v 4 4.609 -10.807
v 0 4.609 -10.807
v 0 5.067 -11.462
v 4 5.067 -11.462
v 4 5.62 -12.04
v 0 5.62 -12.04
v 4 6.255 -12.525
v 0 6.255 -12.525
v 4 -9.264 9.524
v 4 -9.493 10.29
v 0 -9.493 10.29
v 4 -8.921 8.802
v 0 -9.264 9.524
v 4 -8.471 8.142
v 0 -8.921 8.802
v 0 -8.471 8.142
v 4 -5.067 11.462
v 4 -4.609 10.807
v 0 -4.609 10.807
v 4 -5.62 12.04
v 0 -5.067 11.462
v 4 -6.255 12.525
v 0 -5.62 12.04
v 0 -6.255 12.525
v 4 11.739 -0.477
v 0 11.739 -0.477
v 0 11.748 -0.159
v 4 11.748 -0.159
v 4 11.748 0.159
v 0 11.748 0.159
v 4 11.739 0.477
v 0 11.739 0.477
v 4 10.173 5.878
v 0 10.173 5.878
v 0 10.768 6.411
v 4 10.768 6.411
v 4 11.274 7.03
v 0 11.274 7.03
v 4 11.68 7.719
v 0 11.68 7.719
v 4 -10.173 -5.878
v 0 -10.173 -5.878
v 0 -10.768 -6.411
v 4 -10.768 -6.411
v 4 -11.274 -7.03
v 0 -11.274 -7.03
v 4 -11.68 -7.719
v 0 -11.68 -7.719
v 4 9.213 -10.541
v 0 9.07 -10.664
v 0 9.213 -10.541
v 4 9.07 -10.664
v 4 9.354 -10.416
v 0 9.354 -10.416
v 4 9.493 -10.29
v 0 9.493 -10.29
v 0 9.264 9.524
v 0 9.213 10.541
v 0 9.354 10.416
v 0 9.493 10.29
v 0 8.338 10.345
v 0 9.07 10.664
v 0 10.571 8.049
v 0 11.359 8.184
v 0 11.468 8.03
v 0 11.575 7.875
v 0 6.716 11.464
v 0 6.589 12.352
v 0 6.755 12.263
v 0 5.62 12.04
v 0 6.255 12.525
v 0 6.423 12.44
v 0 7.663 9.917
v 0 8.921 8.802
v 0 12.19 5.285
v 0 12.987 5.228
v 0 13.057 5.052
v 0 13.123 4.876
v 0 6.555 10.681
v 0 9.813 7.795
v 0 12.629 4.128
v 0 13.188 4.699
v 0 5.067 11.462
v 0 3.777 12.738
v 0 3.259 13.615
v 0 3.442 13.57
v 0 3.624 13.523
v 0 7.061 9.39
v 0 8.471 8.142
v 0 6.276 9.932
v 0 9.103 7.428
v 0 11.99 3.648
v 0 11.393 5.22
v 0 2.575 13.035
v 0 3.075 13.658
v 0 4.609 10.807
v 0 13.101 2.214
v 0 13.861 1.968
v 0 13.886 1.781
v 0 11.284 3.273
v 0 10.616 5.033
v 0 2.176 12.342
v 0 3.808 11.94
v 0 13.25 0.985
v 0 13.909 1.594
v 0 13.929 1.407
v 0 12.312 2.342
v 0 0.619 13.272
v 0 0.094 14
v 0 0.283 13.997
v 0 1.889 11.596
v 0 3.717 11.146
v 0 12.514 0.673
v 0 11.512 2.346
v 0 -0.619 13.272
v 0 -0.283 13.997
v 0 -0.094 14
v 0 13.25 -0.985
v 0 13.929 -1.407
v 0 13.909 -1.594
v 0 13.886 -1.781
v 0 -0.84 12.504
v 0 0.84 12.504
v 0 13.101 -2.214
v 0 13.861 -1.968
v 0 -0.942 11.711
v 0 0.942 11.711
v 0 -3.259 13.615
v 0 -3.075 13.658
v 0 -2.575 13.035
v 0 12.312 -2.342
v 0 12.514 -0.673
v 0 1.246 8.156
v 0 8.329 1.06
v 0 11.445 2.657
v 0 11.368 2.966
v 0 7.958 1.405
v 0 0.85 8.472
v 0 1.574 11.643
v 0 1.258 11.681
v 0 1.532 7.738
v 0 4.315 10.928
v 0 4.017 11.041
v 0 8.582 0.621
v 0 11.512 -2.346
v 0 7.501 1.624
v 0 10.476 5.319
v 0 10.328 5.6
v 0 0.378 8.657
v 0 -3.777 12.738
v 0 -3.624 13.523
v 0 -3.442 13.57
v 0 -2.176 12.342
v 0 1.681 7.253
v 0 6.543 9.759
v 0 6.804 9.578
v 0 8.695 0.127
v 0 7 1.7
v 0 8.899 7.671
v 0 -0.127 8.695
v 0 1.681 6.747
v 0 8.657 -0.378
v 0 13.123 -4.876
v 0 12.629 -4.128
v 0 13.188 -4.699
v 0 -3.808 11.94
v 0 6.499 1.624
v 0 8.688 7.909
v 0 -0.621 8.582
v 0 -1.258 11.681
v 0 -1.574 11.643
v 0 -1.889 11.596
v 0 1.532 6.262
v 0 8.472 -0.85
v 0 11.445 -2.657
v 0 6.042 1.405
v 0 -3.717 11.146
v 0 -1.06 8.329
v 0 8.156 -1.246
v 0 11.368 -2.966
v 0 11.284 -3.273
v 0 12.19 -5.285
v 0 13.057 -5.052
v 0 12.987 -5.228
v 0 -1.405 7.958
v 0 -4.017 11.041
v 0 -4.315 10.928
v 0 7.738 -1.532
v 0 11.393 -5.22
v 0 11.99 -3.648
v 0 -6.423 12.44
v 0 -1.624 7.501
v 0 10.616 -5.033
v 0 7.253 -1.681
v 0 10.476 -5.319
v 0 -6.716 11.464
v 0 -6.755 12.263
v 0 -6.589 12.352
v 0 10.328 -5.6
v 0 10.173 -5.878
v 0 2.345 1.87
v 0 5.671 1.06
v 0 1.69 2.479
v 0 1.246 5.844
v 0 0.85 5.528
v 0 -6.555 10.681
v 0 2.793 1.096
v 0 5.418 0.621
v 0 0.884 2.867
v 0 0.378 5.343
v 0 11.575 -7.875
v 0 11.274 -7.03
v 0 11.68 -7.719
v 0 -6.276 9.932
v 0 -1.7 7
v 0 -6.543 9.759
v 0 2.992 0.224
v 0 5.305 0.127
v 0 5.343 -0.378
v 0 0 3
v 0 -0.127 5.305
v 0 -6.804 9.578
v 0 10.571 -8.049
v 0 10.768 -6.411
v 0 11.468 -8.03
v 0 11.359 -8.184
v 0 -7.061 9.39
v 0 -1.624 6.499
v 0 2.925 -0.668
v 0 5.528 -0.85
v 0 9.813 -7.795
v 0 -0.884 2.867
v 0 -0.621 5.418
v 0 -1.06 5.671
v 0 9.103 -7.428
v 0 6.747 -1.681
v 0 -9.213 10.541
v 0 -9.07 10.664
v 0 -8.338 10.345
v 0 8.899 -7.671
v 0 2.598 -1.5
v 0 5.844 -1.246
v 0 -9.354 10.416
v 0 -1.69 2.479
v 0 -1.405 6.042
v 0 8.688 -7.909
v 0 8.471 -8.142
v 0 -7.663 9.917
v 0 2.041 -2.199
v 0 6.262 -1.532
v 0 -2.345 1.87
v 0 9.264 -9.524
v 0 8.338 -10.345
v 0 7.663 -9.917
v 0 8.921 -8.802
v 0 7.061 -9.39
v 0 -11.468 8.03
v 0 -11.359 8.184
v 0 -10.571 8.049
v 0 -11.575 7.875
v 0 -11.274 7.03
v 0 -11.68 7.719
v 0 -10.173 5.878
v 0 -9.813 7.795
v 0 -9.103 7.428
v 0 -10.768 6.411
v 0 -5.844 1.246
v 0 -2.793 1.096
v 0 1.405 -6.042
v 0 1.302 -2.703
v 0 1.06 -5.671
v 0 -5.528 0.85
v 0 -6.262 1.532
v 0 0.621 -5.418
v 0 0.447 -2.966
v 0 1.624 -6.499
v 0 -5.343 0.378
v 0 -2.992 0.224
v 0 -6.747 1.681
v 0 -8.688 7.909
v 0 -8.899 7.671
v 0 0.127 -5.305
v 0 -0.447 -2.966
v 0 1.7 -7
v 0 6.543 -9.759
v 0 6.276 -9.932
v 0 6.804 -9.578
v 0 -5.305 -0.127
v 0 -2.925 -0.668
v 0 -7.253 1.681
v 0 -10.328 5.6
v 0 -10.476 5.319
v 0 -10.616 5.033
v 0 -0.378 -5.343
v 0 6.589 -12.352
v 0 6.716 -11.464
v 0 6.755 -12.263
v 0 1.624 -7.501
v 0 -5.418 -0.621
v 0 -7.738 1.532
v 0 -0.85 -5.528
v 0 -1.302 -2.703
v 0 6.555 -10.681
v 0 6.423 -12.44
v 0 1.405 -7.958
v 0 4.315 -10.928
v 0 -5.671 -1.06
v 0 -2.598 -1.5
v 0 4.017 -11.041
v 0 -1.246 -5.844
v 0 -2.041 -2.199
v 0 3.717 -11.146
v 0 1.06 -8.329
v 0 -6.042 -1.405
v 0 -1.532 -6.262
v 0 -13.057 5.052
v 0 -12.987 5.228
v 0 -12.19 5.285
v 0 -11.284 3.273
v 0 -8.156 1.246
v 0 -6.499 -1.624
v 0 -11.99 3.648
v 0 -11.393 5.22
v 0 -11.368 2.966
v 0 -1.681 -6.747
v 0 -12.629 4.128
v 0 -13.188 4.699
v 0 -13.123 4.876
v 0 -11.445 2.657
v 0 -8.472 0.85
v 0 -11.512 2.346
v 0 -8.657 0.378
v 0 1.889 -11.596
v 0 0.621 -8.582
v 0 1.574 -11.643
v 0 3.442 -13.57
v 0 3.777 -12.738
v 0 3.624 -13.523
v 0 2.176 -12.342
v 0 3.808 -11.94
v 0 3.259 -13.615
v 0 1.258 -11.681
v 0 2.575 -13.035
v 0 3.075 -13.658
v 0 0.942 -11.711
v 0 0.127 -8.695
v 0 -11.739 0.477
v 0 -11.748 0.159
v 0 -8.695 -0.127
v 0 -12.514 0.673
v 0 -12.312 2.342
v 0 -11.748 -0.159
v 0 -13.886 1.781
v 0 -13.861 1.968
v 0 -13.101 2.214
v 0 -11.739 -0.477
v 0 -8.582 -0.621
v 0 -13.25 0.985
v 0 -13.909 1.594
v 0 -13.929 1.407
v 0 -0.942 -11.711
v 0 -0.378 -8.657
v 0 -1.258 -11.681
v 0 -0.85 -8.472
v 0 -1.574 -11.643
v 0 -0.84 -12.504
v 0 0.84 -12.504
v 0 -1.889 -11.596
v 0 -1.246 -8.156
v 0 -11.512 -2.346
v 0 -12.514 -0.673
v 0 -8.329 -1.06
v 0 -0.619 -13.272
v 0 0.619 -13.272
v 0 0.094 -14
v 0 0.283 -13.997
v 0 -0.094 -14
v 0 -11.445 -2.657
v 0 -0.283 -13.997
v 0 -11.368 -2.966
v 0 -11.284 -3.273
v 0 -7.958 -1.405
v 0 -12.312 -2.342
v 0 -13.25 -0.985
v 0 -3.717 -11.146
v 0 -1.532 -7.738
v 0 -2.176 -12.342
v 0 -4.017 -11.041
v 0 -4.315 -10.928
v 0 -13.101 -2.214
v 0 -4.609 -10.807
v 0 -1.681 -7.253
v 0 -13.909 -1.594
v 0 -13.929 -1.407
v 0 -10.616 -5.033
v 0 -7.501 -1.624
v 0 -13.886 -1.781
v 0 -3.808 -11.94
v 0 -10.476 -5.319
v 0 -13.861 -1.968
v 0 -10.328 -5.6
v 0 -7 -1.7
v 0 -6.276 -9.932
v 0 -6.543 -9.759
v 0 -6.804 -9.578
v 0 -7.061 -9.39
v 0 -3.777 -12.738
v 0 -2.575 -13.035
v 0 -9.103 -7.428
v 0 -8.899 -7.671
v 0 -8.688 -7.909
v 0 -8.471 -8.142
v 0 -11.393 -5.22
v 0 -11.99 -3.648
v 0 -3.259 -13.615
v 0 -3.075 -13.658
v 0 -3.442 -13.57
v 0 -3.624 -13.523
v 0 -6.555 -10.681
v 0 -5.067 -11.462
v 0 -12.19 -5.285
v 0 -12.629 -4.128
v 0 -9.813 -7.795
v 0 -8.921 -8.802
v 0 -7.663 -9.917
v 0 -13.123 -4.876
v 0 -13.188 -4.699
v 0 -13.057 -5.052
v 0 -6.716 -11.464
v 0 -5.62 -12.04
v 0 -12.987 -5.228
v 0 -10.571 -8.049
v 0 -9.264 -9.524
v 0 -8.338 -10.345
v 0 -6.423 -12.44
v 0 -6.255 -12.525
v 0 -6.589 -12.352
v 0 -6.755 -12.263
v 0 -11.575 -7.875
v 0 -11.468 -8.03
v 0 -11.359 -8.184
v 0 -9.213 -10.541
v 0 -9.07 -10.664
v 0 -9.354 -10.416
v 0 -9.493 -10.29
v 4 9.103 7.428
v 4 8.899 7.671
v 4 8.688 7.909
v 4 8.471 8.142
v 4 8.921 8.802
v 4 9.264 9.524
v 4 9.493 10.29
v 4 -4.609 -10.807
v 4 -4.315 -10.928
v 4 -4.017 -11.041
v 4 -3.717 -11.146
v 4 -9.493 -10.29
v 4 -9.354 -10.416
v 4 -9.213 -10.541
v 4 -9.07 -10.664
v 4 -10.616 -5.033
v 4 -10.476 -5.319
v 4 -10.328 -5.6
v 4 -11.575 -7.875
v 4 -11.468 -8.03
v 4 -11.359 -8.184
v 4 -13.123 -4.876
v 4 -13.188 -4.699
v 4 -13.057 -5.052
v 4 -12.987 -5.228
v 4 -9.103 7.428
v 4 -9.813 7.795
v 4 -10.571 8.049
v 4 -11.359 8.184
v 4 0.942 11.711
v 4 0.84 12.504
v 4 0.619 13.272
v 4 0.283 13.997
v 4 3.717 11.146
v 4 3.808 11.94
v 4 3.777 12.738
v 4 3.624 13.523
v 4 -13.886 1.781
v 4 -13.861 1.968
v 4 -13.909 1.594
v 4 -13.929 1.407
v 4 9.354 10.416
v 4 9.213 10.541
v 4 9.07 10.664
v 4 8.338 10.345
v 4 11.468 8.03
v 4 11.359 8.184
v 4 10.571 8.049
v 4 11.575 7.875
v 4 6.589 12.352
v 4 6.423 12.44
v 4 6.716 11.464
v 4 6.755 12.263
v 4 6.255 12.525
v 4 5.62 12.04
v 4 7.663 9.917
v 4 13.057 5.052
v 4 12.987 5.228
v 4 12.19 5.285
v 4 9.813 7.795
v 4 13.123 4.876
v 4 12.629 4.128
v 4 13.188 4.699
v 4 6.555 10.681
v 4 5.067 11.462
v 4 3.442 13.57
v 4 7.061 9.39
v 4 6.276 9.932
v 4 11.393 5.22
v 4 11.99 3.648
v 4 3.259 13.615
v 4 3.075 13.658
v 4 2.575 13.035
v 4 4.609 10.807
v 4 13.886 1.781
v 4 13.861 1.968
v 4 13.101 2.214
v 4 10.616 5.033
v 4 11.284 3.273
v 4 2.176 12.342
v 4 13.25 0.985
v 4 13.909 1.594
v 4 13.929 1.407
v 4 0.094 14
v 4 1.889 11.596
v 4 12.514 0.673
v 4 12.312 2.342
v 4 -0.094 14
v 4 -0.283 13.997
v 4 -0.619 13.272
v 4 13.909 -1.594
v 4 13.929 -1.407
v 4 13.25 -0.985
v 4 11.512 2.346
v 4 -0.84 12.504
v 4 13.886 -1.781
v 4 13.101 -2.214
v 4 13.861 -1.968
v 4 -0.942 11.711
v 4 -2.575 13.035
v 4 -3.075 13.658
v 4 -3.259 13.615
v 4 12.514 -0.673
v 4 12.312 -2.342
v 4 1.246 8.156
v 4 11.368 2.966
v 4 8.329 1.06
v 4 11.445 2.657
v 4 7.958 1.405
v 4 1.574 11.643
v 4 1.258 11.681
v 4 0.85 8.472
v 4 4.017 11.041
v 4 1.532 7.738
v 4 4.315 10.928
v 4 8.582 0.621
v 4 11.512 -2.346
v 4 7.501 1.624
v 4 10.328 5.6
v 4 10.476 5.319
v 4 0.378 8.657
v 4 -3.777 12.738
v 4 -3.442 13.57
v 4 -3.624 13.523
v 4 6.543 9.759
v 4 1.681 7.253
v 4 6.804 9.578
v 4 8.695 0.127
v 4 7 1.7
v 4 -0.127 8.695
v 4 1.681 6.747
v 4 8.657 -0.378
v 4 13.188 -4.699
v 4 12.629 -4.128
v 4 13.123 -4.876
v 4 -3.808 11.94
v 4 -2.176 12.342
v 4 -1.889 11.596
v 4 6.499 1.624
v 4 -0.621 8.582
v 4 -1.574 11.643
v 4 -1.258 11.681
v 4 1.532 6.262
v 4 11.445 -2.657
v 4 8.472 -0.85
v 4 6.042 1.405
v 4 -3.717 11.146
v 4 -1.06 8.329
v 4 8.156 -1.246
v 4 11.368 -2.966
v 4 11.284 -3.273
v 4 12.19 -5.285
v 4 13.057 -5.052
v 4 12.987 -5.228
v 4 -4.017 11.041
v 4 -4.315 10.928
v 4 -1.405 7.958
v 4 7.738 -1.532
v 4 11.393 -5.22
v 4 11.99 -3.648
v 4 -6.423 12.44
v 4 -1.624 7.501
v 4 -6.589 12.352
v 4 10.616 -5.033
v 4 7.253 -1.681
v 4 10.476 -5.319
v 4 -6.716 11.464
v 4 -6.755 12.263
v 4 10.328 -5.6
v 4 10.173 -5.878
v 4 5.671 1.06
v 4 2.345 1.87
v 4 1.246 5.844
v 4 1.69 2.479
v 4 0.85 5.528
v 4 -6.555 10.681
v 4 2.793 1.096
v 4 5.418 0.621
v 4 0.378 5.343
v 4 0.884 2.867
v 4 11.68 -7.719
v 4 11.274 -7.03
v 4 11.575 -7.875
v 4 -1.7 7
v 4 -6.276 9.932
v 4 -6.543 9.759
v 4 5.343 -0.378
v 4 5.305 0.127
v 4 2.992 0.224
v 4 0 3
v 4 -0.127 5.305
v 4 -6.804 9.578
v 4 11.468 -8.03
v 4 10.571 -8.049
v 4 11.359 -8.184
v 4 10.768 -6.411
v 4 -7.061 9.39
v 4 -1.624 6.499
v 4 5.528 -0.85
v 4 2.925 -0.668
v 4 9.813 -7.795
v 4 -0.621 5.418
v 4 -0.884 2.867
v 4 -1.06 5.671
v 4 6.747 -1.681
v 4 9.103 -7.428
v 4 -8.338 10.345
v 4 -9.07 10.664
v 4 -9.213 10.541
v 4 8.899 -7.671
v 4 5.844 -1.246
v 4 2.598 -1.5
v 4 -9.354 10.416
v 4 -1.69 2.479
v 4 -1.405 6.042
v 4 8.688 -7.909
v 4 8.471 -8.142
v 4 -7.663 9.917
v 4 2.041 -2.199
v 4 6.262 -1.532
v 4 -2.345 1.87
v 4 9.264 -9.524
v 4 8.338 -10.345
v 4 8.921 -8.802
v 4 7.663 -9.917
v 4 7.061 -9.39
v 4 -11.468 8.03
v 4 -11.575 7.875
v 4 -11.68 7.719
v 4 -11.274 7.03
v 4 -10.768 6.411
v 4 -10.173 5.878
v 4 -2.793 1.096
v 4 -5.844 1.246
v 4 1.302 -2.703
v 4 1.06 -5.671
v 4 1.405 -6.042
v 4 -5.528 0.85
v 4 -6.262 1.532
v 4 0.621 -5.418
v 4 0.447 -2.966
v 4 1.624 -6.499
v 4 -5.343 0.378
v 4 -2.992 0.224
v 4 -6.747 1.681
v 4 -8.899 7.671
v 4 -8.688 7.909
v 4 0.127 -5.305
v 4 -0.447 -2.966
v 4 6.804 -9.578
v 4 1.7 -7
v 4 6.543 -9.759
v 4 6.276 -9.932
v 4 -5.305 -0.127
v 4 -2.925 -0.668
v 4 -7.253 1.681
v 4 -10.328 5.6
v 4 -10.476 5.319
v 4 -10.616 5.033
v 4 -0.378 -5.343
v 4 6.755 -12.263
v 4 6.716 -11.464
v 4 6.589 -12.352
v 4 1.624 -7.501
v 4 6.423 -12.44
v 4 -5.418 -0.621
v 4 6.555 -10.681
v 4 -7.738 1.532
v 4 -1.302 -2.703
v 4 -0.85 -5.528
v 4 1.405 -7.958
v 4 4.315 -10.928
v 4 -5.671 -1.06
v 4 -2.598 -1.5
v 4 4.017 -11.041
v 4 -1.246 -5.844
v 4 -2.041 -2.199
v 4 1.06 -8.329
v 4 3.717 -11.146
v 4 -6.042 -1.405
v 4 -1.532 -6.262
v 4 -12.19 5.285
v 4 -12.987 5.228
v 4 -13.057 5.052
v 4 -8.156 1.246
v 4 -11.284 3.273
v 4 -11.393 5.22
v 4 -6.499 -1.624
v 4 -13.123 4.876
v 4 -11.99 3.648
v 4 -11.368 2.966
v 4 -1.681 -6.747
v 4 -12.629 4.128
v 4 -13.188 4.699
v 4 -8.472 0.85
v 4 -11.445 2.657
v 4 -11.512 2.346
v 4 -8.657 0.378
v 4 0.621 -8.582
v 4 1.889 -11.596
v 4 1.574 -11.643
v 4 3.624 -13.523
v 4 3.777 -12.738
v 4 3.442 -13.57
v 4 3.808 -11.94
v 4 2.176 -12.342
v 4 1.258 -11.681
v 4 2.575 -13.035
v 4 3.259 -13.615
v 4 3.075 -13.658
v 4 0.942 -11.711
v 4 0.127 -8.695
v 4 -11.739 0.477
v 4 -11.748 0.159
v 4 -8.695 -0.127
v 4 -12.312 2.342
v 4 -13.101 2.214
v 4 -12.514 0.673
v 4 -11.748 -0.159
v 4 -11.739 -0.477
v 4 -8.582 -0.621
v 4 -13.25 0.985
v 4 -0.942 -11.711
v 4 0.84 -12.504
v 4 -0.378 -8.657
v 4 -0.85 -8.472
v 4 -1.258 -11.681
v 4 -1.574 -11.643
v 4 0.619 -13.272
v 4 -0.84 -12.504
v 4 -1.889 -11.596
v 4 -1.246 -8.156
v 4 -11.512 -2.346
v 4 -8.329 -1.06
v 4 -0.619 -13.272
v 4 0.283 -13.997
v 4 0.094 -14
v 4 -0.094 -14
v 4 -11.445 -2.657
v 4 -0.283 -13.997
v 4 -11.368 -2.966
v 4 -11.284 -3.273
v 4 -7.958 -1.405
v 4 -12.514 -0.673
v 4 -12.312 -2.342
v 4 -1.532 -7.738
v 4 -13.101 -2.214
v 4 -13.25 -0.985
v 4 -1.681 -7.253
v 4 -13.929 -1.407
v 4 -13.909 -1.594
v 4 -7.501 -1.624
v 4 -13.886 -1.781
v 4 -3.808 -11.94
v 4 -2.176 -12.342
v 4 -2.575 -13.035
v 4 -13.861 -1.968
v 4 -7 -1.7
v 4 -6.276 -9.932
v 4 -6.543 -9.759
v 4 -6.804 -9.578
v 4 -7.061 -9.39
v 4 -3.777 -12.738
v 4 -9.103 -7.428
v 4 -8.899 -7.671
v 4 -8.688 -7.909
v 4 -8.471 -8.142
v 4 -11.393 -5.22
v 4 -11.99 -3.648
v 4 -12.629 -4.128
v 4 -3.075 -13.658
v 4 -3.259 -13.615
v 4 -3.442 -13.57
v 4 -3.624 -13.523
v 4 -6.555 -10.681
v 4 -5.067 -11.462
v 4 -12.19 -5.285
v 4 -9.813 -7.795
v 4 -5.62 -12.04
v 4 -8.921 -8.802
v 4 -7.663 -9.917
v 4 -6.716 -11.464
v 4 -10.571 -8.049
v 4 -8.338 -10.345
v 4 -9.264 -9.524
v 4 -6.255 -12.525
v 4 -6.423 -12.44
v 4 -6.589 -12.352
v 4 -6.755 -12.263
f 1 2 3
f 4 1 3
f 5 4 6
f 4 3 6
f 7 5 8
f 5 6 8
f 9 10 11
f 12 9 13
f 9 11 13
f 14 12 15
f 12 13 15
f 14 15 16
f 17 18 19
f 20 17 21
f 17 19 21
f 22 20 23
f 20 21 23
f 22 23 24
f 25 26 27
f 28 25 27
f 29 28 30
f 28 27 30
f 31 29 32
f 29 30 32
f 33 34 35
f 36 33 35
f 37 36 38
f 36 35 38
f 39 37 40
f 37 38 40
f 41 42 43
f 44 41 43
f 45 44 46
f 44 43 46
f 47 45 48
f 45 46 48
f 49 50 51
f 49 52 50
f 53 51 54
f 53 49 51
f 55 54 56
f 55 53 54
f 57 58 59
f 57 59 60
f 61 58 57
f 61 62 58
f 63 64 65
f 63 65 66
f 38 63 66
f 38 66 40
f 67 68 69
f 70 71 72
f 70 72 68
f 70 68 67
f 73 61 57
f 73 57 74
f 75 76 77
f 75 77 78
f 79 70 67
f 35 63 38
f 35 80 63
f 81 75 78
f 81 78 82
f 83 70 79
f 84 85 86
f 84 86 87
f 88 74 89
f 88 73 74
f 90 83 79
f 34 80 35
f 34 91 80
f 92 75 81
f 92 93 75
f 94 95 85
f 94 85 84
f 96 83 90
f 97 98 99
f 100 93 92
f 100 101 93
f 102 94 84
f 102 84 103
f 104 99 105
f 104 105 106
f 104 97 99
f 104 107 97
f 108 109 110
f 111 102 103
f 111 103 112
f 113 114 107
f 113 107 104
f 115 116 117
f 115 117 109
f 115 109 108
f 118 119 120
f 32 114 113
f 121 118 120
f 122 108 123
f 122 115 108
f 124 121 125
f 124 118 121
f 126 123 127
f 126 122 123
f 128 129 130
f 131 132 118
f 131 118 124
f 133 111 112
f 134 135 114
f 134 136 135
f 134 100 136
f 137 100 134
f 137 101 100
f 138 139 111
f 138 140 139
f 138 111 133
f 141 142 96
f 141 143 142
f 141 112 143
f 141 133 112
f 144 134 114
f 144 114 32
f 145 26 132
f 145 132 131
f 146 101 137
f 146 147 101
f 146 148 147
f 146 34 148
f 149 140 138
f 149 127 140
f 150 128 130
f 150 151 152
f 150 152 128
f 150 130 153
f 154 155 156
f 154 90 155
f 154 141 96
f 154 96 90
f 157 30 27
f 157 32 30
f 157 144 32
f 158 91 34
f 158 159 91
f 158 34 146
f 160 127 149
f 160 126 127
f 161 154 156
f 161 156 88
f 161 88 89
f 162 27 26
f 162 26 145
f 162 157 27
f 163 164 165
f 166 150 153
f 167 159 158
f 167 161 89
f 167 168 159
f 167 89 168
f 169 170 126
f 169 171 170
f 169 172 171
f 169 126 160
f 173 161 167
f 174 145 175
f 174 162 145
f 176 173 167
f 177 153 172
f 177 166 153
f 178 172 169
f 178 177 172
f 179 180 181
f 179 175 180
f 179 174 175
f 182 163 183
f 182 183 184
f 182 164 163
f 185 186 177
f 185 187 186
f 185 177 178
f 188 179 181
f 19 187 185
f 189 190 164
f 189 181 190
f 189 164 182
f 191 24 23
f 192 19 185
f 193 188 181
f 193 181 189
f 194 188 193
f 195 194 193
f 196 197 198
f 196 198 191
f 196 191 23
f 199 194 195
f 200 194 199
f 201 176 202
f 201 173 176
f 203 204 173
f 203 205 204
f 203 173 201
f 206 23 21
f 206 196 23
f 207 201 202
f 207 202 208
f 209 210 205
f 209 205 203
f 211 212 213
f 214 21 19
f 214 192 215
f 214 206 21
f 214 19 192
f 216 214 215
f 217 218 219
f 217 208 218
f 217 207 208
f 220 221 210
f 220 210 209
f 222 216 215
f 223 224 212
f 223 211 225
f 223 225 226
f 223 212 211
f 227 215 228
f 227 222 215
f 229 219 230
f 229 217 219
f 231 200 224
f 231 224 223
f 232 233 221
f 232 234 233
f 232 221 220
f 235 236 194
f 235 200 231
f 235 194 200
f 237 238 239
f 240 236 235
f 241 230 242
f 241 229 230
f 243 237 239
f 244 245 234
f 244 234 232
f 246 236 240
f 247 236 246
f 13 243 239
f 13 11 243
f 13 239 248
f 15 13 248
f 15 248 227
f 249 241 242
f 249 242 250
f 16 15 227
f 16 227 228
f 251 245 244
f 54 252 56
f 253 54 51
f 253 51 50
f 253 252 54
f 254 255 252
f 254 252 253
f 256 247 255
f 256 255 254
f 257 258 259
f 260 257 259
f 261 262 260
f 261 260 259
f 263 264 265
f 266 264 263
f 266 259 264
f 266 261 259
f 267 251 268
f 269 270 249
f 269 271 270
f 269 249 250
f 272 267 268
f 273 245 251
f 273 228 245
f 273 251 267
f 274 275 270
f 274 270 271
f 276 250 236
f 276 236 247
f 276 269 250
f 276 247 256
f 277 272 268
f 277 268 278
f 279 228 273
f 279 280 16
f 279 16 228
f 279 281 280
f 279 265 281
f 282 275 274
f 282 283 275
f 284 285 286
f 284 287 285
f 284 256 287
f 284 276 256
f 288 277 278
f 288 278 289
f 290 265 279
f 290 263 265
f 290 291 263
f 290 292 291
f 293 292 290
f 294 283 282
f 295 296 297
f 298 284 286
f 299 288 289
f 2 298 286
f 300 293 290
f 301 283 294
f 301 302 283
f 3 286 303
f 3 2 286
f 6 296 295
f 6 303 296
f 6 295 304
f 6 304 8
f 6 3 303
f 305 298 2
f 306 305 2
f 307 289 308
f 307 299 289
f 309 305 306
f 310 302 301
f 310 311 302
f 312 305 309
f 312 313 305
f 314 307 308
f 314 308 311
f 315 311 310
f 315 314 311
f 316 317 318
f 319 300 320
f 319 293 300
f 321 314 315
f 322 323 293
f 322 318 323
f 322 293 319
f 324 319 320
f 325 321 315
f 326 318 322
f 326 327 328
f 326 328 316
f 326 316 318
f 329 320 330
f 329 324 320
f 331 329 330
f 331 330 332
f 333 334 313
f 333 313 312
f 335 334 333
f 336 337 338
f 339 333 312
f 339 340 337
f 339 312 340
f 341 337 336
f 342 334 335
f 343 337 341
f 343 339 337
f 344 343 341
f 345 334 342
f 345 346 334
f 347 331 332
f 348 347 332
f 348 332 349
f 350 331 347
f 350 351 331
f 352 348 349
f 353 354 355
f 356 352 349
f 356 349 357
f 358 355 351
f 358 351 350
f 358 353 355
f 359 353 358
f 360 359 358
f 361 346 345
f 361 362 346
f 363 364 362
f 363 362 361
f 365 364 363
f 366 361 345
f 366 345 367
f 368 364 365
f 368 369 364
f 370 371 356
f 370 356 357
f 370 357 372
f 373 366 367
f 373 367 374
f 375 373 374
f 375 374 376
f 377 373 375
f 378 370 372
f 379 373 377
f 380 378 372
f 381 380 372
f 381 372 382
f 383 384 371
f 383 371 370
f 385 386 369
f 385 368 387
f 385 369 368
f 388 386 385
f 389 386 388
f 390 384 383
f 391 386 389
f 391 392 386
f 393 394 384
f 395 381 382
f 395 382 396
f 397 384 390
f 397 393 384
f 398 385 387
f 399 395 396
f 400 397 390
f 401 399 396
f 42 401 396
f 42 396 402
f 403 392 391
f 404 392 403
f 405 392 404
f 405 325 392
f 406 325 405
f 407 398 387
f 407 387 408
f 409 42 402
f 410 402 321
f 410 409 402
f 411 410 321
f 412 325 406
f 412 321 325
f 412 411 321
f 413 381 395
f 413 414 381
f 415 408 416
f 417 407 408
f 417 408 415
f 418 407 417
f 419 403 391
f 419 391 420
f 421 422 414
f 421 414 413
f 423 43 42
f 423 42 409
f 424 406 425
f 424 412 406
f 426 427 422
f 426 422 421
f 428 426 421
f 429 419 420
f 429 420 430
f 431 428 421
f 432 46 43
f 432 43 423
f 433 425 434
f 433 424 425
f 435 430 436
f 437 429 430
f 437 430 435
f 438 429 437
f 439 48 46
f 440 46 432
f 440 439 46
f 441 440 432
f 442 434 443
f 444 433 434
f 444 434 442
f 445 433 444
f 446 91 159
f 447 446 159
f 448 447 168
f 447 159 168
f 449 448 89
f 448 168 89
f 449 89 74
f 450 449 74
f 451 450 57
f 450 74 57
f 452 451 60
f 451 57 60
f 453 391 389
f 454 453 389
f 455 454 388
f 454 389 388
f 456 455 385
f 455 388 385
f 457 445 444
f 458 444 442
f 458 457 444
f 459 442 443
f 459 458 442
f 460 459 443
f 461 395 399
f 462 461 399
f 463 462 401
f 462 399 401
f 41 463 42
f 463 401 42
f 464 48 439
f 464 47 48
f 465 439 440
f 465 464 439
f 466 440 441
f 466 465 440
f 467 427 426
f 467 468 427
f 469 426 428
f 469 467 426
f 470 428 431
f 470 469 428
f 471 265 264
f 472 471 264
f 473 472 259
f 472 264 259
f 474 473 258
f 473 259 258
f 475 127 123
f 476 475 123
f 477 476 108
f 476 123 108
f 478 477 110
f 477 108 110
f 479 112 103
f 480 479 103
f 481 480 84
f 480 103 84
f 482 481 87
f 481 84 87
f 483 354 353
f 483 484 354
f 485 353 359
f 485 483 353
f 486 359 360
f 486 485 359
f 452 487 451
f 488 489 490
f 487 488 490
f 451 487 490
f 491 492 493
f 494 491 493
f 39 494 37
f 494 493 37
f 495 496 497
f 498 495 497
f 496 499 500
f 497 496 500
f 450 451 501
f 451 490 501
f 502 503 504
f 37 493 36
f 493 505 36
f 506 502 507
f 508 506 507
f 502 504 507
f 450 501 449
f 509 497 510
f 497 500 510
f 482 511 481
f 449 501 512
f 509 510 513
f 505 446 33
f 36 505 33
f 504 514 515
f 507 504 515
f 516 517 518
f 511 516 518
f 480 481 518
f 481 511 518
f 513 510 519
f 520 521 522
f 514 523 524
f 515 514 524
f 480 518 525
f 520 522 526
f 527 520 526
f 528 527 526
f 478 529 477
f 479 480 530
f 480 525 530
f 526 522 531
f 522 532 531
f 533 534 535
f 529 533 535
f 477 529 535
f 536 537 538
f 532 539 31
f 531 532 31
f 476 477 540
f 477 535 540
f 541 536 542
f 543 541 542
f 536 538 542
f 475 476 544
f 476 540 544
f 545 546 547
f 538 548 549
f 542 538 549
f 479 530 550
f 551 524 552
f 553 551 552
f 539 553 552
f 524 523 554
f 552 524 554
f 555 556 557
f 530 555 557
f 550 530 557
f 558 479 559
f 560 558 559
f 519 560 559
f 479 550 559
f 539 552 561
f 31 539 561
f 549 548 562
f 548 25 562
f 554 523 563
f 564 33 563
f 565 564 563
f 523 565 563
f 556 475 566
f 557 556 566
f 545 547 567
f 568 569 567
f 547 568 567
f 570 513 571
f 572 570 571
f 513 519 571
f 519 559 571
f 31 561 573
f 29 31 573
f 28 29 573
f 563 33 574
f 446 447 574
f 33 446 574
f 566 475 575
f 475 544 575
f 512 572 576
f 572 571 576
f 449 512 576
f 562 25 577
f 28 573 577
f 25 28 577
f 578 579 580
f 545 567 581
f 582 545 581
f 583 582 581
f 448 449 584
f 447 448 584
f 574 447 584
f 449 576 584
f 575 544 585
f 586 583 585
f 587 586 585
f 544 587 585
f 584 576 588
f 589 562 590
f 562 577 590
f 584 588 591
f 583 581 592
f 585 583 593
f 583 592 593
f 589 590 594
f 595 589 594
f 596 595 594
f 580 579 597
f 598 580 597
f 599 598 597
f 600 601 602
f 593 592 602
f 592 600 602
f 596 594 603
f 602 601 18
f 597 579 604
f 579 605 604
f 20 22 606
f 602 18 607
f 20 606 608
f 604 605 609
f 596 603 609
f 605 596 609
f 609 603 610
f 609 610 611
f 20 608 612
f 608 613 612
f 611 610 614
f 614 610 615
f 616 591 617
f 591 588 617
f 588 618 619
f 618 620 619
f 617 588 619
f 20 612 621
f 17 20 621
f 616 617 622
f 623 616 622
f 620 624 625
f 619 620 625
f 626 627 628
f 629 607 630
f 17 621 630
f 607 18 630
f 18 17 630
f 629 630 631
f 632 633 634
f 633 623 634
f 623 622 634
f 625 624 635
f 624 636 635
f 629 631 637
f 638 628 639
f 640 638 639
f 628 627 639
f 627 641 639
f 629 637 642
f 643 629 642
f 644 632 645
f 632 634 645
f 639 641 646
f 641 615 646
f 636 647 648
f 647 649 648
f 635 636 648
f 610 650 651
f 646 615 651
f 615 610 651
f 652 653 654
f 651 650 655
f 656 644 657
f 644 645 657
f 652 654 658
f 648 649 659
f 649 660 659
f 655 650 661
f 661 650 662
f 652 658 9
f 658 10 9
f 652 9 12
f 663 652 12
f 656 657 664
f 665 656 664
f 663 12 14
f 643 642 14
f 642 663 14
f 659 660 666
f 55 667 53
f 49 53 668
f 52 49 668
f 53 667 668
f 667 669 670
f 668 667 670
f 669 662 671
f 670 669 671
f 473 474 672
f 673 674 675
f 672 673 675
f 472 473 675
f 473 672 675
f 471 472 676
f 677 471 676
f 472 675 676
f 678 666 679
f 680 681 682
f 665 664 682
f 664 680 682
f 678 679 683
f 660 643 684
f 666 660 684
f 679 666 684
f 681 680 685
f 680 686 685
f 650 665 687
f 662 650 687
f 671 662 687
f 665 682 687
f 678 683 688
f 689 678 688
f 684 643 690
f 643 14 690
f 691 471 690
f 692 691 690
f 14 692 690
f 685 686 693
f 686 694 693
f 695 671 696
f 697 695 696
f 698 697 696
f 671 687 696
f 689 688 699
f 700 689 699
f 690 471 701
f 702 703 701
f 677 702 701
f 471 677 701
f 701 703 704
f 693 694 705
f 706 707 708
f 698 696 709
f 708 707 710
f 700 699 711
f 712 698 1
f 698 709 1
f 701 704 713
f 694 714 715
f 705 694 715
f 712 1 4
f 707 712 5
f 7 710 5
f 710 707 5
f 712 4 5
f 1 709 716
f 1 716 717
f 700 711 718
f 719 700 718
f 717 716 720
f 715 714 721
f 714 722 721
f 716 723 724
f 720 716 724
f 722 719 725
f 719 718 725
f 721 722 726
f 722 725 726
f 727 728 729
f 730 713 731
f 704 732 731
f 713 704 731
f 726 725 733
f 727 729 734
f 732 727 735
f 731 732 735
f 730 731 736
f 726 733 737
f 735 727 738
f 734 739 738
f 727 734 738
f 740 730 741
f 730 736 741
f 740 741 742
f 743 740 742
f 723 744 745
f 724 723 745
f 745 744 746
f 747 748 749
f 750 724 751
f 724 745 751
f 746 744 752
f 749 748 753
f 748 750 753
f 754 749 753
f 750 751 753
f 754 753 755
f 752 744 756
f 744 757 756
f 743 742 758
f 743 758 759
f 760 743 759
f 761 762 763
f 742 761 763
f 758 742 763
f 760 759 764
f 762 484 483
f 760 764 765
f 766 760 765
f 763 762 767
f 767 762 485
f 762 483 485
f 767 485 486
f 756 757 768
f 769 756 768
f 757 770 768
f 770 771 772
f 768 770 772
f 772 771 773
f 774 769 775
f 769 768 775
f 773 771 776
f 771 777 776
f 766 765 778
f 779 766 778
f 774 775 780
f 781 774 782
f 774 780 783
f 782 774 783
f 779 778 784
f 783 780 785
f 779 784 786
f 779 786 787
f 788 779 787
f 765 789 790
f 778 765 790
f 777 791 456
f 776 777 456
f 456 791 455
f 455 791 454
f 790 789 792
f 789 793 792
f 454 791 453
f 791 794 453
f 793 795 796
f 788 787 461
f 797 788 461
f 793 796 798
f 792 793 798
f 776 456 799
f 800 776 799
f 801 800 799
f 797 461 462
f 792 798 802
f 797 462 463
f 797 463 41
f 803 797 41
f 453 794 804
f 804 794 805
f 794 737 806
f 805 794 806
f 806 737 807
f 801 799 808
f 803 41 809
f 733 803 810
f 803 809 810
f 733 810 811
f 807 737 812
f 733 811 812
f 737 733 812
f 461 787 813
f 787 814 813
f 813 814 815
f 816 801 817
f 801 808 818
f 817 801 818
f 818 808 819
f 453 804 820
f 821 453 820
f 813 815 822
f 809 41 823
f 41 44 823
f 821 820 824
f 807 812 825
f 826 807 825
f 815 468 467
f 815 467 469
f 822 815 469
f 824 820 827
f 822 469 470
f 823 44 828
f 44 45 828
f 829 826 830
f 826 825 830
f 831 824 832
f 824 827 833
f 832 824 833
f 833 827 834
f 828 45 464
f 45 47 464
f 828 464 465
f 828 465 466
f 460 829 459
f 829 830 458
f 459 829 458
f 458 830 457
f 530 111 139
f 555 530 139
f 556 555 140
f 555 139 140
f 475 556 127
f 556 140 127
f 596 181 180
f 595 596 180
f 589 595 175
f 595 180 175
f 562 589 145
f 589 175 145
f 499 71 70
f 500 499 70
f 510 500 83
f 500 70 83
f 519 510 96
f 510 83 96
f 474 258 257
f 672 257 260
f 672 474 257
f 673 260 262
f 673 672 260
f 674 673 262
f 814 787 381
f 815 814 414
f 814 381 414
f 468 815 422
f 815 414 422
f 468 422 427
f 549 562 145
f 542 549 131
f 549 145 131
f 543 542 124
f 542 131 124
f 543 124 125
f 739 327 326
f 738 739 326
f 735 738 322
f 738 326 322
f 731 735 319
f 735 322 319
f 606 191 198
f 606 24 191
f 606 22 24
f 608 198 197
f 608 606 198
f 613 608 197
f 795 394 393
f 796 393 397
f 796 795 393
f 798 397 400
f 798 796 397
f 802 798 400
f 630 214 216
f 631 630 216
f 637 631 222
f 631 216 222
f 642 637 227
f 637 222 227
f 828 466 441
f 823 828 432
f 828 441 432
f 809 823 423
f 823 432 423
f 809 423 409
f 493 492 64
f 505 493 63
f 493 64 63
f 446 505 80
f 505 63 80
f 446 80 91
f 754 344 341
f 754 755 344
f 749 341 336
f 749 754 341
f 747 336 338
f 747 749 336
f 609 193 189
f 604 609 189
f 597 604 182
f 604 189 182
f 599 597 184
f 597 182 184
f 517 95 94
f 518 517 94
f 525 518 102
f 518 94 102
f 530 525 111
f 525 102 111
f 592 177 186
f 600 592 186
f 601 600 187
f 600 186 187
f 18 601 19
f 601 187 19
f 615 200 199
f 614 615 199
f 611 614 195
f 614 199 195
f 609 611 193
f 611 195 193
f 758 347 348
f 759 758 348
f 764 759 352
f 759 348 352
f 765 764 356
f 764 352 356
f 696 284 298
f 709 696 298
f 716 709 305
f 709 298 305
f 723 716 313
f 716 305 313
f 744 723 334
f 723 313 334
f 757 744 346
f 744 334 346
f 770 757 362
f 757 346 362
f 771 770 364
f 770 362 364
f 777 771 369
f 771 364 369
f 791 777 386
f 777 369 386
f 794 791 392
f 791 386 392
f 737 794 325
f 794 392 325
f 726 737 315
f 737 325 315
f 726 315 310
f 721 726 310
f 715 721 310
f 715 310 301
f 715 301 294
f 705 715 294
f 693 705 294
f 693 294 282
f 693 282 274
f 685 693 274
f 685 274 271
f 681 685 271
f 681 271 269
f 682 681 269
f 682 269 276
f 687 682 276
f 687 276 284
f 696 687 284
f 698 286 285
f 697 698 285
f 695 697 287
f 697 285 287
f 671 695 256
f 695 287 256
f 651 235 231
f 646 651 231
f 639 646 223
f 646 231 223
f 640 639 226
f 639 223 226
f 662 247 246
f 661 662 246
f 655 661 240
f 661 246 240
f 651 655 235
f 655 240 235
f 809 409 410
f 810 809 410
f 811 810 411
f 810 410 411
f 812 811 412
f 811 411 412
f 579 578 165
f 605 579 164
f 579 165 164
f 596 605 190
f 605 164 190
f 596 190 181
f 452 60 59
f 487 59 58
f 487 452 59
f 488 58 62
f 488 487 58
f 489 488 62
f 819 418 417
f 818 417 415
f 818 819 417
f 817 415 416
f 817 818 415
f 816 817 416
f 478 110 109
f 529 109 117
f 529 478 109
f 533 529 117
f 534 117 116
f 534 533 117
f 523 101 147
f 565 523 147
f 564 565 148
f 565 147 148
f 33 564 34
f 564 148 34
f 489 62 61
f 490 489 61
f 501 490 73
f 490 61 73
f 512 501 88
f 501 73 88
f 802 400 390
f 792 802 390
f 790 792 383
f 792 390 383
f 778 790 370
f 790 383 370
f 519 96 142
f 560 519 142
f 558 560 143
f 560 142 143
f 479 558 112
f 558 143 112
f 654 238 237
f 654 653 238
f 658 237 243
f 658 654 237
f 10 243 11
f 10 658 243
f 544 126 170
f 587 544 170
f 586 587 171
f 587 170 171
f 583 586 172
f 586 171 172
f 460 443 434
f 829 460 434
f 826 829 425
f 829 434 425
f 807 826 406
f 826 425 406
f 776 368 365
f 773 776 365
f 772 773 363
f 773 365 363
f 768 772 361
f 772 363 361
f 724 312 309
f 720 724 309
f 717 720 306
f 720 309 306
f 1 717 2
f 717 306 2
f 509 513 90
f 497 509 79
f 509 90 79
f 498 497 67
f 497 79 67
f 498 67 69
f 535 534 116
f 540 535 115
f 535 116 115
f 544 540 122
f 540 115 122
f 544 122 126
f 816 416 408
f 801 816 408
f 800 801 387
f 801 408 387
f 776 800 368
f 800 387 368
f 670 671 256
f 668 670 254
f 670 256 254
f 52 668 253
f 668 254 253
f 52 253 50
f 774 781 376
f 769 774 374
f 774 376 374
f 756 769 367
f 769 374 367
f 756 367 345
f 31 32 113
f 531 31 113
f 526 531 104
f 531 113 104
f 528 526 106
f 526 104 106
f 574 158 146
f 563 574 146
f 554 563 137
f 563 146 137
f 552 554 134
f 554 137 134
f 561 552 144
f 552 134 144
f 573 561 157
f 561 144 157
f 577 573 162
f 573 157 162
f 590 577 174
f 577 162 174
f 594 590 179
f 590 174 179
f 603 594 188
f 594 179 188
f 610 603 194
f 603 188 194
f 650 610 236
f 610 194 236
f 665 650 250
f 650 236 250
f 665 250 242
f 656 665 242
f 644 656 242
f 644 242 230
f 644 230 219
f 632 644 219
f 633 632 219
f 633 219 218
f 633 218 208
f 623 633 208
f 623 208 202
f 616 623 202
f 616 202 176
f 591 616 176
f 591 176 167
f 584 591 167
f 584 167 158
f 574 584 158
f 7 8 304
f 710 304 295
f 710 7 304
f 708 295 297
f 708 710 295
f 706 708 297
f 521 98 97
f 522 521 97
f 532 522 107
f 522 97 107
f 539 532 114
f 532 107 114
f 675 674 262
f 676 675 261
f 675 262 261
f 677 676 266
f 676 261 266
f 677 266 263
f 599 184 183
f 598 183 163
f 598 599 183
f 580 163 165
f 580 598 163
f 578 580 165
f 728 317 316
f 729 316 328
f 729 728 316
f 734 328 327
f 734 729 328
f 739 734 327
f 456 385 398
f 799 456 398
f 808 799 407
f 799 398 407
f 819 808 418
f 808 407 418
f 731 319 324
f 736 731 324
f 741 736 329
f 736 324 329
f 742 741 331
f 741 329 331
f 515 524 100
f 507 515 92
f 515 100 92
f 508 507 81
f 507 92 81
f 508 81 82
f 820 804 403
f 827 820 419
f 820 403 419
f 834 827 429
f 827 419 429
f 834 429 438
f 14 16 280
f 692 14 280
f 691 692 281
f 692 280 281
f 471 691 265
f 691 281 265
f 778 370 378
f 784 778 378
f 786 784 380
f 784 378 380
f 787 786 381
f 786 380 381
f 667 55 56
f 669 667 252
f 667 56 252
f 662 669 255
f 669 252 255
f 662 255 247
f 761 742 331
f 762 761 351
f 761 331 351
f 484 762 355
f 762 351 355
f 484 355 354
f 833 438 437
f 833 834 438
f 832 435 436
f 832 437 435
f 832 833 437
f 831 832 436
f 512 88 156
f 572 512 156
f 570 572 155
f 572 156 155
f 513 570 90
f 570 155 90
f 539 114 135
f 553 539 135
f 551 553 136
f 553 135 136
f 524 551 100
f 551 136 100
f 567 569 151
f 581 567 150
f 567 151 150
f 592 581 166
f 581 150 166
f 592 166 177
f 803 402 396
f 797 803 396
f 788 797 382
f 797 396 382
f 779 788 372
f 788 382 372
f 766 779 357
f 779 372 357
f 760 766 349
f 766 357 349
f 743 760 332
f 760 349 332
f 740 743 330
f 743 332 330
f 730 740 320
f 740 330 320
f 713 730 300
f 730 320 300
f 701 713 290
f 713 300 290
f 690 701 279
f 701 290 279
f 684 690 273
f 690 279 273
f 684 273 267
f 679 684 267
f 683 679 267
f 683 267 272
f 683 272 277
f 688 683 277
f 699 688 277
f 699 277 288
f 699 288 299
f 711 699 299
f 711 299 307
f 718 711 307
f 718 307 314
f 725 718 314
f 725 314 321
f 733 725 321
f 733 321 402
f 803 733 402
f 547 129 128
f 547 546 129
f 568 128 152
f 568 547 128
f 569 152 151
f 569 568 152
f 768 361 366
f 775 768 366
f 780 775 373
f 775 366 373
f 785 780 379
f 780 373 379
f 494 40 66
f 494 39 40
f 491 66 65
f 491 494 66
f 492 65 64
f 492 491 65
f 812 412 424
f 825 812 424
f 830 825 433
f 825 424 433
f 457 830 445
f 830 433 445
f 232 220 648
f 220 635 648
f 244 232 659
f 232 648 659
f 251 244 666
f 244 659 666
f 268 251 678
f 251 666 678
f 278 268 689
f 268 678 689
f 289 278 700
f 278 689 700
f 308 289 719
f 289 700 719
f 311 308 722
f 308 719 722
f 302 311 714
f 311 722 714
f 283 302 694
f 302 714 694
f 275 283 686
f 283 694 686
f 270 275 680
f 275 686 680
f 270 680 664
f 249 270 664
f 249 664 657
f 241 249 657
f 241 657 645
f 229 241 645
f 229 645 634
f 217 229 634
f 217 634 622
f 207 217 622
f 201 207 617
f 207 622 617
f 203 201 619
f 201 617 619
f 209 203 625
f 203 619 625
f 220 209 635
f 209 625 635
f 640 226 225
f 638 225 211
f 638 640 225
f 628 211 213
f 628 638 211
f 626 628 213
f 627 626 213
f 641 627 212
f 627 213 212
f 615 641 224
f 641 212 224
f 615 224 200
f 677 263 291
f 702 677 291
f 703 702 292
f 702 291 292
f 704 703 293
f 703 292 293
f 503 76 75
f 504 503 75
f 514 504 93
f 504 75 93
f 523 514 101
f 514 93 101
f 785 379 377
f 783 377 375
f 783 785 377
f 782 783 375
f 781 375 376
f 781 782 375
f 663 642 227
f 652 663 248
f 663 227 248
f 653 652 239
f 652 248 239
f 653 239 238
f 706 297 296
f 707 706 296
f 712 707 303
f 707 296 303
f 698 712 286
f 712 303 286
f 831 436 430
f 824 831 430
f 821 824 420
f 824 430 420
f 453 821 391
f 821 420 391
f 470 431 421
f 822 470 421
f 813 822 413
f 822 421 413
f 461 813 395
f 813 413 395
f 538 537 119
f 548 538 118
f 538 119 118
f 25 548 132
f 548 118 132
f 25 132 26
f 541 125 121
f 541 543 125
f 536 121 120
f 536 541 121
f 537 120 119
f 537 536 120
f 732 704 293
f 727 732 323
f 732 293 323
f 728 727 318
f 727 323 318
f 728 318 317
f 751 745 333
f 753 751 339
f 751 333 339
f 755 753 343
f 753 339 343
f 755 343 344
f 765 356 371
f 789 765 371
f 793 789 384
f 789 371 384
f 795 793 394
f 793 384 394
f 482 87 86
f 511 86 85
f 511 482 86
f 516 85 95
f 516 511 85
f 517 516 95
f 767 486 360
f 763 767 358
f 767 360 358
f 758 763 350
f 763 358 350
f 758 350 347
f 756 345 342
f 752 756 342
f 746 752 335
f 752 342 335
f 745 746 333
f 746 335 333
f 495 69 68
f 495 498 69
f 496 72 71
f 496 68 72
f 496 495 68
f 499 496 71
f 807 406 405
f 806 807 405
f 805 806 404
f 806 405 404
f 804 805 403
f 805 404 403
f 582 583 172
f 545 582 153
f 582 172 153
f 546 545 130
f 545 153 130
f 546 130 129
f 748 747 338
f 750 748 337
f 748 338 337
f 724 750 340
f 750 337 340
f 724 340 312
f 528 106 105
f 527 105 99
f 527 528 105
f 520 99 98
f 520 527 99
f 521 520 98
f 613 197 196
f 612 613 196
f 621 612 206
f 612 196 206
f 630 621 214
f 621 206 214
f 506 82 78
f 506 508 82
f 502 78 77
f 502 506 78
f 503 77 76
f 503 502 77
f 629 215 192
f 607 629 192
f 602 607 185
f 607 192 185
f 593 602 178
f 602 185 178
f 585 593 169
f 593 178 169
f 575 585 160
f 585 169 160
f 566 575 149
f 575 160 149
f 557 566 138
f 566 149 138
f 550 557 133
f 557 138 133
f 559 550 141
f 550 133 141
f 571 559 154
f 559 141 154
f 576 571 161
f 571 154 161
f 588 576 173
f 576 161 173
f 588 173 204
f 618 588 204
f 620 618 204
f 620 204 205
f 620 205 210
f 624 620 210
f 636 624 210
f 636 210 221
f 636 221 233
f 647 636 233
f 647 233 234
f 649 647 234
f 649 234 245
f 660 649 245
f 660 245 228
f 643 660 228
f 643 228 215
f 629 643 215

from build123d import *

# Parameters (mm, degrees)
BASPROSKE_W        = 4
BASPROSKE_H        = 14
TOOTHCUT_DEPTH     = 21.199009877
TEETHCUTS_COUNT    = 26
TEETHCUTS_ANGLE    = 346.153846154
BORSKE_R           = 3
BORE_DEPTH         = 50.0000508
HOLE_WIZARD_M3_1_D = 3.4
CIRPATTERN1_COUNT  = 4


with BuildPart() as part:
    # BasProSke → Base-Revolve (revolve)
    with BuildSketch(Plane(origin=(0, 0, 0), x_dir=(1, 0, 0), z_dir=(0, 1, 0)), mode=Mode.PRIVATE) as base_revolve_sk:
        with Locations((2, 7)):
            Rectangle(BASPROSKE_W, BASPROSKE_H)
    revolve(base_revolve_sk.sketch.rotate(Axis((-10, 0, 0), (1, 0, 0)), 180), axis=Axis((-10, 0, 0), (1, 0, 0)))

    # TooCutSke → ToothCut (cut, through all)
    with BuildSketch(Plane(origin=(0, 0, 0), x_dir=(0, 0, -1), z_dir=(1, 0, 0))):
        with BuildLine():
            ThreePointArc((0.476965065, 11.739314517), (0, 11.749), (-0.476965065, 11.739314517))
            ThreePointArc((-0.476965065, 11.739314517), (-0.82065865, 12.901686978), (-1.424117301, 13.952911348))
            ThreePointArc((-1.424117301, 13.952911348), (0, 14.0254), (1.424117301, 13.952911348))
            ThreePointArc((1.424117301, 13.952911348), (0.82065865, 12.901686978), (0.476965065, 11.739314517))
        make_face()
    toothcut = extrude(amount=TOOTHCUT_DEPTH, mode=Mode.SUBTRACT)

    # TeethCuts: ToothCut ×26 about axis
    teethcuts_axis = Axis((-10, 0, 0), (1, 0, 0))
    for i in range(1, TEETHCUTS_COUNT):
        add(toothcut.rotate(teethcuts_axis, i * TEETHCUTS_ANGLE / (TEETHCUTS_COUNT - 1)), mode=Mode.SUBTRACT)

    # BorSke → Bore (cut, symmetric)
    with BuildSketch(Plane(origin=(0, 0, 0), x_dir=(0, 0, -1), z_dir=(1, 0, 0))):
        with Locations(Location((0, 0, 0), (0, 0, 180))):
            Circle(BORSKE_R)
    extrude(amount=BORE_DEPTH, both=True, mode=Mode.SUBTRACT)

    # M3 餘隙孔1 (through all)
    with Locations(Plane(origin=(4, 0, 0), x_dir=(0, 0, -1), z_dir=(1, 0, 0))):
        with Locations((0, 7)):
            hole_wizard_m3_1 = Hole(HOLE_WIZARD_M3_1_D / 2)

    # CirPattern1: M3 餘隙孔1 ×4 about axis
    cirpattern1_axis = Axis((0, 0, 0), (1, 0, 0))
    for i in range(1, CIRPATTERN1_COUNT):
        add(hole_wizard_m3_1.rotate(cirpattern1_axis, i * 360 / CIRPATTERN1_COUNT), mode=Mode.SUBTRACT)


solid = part.part
